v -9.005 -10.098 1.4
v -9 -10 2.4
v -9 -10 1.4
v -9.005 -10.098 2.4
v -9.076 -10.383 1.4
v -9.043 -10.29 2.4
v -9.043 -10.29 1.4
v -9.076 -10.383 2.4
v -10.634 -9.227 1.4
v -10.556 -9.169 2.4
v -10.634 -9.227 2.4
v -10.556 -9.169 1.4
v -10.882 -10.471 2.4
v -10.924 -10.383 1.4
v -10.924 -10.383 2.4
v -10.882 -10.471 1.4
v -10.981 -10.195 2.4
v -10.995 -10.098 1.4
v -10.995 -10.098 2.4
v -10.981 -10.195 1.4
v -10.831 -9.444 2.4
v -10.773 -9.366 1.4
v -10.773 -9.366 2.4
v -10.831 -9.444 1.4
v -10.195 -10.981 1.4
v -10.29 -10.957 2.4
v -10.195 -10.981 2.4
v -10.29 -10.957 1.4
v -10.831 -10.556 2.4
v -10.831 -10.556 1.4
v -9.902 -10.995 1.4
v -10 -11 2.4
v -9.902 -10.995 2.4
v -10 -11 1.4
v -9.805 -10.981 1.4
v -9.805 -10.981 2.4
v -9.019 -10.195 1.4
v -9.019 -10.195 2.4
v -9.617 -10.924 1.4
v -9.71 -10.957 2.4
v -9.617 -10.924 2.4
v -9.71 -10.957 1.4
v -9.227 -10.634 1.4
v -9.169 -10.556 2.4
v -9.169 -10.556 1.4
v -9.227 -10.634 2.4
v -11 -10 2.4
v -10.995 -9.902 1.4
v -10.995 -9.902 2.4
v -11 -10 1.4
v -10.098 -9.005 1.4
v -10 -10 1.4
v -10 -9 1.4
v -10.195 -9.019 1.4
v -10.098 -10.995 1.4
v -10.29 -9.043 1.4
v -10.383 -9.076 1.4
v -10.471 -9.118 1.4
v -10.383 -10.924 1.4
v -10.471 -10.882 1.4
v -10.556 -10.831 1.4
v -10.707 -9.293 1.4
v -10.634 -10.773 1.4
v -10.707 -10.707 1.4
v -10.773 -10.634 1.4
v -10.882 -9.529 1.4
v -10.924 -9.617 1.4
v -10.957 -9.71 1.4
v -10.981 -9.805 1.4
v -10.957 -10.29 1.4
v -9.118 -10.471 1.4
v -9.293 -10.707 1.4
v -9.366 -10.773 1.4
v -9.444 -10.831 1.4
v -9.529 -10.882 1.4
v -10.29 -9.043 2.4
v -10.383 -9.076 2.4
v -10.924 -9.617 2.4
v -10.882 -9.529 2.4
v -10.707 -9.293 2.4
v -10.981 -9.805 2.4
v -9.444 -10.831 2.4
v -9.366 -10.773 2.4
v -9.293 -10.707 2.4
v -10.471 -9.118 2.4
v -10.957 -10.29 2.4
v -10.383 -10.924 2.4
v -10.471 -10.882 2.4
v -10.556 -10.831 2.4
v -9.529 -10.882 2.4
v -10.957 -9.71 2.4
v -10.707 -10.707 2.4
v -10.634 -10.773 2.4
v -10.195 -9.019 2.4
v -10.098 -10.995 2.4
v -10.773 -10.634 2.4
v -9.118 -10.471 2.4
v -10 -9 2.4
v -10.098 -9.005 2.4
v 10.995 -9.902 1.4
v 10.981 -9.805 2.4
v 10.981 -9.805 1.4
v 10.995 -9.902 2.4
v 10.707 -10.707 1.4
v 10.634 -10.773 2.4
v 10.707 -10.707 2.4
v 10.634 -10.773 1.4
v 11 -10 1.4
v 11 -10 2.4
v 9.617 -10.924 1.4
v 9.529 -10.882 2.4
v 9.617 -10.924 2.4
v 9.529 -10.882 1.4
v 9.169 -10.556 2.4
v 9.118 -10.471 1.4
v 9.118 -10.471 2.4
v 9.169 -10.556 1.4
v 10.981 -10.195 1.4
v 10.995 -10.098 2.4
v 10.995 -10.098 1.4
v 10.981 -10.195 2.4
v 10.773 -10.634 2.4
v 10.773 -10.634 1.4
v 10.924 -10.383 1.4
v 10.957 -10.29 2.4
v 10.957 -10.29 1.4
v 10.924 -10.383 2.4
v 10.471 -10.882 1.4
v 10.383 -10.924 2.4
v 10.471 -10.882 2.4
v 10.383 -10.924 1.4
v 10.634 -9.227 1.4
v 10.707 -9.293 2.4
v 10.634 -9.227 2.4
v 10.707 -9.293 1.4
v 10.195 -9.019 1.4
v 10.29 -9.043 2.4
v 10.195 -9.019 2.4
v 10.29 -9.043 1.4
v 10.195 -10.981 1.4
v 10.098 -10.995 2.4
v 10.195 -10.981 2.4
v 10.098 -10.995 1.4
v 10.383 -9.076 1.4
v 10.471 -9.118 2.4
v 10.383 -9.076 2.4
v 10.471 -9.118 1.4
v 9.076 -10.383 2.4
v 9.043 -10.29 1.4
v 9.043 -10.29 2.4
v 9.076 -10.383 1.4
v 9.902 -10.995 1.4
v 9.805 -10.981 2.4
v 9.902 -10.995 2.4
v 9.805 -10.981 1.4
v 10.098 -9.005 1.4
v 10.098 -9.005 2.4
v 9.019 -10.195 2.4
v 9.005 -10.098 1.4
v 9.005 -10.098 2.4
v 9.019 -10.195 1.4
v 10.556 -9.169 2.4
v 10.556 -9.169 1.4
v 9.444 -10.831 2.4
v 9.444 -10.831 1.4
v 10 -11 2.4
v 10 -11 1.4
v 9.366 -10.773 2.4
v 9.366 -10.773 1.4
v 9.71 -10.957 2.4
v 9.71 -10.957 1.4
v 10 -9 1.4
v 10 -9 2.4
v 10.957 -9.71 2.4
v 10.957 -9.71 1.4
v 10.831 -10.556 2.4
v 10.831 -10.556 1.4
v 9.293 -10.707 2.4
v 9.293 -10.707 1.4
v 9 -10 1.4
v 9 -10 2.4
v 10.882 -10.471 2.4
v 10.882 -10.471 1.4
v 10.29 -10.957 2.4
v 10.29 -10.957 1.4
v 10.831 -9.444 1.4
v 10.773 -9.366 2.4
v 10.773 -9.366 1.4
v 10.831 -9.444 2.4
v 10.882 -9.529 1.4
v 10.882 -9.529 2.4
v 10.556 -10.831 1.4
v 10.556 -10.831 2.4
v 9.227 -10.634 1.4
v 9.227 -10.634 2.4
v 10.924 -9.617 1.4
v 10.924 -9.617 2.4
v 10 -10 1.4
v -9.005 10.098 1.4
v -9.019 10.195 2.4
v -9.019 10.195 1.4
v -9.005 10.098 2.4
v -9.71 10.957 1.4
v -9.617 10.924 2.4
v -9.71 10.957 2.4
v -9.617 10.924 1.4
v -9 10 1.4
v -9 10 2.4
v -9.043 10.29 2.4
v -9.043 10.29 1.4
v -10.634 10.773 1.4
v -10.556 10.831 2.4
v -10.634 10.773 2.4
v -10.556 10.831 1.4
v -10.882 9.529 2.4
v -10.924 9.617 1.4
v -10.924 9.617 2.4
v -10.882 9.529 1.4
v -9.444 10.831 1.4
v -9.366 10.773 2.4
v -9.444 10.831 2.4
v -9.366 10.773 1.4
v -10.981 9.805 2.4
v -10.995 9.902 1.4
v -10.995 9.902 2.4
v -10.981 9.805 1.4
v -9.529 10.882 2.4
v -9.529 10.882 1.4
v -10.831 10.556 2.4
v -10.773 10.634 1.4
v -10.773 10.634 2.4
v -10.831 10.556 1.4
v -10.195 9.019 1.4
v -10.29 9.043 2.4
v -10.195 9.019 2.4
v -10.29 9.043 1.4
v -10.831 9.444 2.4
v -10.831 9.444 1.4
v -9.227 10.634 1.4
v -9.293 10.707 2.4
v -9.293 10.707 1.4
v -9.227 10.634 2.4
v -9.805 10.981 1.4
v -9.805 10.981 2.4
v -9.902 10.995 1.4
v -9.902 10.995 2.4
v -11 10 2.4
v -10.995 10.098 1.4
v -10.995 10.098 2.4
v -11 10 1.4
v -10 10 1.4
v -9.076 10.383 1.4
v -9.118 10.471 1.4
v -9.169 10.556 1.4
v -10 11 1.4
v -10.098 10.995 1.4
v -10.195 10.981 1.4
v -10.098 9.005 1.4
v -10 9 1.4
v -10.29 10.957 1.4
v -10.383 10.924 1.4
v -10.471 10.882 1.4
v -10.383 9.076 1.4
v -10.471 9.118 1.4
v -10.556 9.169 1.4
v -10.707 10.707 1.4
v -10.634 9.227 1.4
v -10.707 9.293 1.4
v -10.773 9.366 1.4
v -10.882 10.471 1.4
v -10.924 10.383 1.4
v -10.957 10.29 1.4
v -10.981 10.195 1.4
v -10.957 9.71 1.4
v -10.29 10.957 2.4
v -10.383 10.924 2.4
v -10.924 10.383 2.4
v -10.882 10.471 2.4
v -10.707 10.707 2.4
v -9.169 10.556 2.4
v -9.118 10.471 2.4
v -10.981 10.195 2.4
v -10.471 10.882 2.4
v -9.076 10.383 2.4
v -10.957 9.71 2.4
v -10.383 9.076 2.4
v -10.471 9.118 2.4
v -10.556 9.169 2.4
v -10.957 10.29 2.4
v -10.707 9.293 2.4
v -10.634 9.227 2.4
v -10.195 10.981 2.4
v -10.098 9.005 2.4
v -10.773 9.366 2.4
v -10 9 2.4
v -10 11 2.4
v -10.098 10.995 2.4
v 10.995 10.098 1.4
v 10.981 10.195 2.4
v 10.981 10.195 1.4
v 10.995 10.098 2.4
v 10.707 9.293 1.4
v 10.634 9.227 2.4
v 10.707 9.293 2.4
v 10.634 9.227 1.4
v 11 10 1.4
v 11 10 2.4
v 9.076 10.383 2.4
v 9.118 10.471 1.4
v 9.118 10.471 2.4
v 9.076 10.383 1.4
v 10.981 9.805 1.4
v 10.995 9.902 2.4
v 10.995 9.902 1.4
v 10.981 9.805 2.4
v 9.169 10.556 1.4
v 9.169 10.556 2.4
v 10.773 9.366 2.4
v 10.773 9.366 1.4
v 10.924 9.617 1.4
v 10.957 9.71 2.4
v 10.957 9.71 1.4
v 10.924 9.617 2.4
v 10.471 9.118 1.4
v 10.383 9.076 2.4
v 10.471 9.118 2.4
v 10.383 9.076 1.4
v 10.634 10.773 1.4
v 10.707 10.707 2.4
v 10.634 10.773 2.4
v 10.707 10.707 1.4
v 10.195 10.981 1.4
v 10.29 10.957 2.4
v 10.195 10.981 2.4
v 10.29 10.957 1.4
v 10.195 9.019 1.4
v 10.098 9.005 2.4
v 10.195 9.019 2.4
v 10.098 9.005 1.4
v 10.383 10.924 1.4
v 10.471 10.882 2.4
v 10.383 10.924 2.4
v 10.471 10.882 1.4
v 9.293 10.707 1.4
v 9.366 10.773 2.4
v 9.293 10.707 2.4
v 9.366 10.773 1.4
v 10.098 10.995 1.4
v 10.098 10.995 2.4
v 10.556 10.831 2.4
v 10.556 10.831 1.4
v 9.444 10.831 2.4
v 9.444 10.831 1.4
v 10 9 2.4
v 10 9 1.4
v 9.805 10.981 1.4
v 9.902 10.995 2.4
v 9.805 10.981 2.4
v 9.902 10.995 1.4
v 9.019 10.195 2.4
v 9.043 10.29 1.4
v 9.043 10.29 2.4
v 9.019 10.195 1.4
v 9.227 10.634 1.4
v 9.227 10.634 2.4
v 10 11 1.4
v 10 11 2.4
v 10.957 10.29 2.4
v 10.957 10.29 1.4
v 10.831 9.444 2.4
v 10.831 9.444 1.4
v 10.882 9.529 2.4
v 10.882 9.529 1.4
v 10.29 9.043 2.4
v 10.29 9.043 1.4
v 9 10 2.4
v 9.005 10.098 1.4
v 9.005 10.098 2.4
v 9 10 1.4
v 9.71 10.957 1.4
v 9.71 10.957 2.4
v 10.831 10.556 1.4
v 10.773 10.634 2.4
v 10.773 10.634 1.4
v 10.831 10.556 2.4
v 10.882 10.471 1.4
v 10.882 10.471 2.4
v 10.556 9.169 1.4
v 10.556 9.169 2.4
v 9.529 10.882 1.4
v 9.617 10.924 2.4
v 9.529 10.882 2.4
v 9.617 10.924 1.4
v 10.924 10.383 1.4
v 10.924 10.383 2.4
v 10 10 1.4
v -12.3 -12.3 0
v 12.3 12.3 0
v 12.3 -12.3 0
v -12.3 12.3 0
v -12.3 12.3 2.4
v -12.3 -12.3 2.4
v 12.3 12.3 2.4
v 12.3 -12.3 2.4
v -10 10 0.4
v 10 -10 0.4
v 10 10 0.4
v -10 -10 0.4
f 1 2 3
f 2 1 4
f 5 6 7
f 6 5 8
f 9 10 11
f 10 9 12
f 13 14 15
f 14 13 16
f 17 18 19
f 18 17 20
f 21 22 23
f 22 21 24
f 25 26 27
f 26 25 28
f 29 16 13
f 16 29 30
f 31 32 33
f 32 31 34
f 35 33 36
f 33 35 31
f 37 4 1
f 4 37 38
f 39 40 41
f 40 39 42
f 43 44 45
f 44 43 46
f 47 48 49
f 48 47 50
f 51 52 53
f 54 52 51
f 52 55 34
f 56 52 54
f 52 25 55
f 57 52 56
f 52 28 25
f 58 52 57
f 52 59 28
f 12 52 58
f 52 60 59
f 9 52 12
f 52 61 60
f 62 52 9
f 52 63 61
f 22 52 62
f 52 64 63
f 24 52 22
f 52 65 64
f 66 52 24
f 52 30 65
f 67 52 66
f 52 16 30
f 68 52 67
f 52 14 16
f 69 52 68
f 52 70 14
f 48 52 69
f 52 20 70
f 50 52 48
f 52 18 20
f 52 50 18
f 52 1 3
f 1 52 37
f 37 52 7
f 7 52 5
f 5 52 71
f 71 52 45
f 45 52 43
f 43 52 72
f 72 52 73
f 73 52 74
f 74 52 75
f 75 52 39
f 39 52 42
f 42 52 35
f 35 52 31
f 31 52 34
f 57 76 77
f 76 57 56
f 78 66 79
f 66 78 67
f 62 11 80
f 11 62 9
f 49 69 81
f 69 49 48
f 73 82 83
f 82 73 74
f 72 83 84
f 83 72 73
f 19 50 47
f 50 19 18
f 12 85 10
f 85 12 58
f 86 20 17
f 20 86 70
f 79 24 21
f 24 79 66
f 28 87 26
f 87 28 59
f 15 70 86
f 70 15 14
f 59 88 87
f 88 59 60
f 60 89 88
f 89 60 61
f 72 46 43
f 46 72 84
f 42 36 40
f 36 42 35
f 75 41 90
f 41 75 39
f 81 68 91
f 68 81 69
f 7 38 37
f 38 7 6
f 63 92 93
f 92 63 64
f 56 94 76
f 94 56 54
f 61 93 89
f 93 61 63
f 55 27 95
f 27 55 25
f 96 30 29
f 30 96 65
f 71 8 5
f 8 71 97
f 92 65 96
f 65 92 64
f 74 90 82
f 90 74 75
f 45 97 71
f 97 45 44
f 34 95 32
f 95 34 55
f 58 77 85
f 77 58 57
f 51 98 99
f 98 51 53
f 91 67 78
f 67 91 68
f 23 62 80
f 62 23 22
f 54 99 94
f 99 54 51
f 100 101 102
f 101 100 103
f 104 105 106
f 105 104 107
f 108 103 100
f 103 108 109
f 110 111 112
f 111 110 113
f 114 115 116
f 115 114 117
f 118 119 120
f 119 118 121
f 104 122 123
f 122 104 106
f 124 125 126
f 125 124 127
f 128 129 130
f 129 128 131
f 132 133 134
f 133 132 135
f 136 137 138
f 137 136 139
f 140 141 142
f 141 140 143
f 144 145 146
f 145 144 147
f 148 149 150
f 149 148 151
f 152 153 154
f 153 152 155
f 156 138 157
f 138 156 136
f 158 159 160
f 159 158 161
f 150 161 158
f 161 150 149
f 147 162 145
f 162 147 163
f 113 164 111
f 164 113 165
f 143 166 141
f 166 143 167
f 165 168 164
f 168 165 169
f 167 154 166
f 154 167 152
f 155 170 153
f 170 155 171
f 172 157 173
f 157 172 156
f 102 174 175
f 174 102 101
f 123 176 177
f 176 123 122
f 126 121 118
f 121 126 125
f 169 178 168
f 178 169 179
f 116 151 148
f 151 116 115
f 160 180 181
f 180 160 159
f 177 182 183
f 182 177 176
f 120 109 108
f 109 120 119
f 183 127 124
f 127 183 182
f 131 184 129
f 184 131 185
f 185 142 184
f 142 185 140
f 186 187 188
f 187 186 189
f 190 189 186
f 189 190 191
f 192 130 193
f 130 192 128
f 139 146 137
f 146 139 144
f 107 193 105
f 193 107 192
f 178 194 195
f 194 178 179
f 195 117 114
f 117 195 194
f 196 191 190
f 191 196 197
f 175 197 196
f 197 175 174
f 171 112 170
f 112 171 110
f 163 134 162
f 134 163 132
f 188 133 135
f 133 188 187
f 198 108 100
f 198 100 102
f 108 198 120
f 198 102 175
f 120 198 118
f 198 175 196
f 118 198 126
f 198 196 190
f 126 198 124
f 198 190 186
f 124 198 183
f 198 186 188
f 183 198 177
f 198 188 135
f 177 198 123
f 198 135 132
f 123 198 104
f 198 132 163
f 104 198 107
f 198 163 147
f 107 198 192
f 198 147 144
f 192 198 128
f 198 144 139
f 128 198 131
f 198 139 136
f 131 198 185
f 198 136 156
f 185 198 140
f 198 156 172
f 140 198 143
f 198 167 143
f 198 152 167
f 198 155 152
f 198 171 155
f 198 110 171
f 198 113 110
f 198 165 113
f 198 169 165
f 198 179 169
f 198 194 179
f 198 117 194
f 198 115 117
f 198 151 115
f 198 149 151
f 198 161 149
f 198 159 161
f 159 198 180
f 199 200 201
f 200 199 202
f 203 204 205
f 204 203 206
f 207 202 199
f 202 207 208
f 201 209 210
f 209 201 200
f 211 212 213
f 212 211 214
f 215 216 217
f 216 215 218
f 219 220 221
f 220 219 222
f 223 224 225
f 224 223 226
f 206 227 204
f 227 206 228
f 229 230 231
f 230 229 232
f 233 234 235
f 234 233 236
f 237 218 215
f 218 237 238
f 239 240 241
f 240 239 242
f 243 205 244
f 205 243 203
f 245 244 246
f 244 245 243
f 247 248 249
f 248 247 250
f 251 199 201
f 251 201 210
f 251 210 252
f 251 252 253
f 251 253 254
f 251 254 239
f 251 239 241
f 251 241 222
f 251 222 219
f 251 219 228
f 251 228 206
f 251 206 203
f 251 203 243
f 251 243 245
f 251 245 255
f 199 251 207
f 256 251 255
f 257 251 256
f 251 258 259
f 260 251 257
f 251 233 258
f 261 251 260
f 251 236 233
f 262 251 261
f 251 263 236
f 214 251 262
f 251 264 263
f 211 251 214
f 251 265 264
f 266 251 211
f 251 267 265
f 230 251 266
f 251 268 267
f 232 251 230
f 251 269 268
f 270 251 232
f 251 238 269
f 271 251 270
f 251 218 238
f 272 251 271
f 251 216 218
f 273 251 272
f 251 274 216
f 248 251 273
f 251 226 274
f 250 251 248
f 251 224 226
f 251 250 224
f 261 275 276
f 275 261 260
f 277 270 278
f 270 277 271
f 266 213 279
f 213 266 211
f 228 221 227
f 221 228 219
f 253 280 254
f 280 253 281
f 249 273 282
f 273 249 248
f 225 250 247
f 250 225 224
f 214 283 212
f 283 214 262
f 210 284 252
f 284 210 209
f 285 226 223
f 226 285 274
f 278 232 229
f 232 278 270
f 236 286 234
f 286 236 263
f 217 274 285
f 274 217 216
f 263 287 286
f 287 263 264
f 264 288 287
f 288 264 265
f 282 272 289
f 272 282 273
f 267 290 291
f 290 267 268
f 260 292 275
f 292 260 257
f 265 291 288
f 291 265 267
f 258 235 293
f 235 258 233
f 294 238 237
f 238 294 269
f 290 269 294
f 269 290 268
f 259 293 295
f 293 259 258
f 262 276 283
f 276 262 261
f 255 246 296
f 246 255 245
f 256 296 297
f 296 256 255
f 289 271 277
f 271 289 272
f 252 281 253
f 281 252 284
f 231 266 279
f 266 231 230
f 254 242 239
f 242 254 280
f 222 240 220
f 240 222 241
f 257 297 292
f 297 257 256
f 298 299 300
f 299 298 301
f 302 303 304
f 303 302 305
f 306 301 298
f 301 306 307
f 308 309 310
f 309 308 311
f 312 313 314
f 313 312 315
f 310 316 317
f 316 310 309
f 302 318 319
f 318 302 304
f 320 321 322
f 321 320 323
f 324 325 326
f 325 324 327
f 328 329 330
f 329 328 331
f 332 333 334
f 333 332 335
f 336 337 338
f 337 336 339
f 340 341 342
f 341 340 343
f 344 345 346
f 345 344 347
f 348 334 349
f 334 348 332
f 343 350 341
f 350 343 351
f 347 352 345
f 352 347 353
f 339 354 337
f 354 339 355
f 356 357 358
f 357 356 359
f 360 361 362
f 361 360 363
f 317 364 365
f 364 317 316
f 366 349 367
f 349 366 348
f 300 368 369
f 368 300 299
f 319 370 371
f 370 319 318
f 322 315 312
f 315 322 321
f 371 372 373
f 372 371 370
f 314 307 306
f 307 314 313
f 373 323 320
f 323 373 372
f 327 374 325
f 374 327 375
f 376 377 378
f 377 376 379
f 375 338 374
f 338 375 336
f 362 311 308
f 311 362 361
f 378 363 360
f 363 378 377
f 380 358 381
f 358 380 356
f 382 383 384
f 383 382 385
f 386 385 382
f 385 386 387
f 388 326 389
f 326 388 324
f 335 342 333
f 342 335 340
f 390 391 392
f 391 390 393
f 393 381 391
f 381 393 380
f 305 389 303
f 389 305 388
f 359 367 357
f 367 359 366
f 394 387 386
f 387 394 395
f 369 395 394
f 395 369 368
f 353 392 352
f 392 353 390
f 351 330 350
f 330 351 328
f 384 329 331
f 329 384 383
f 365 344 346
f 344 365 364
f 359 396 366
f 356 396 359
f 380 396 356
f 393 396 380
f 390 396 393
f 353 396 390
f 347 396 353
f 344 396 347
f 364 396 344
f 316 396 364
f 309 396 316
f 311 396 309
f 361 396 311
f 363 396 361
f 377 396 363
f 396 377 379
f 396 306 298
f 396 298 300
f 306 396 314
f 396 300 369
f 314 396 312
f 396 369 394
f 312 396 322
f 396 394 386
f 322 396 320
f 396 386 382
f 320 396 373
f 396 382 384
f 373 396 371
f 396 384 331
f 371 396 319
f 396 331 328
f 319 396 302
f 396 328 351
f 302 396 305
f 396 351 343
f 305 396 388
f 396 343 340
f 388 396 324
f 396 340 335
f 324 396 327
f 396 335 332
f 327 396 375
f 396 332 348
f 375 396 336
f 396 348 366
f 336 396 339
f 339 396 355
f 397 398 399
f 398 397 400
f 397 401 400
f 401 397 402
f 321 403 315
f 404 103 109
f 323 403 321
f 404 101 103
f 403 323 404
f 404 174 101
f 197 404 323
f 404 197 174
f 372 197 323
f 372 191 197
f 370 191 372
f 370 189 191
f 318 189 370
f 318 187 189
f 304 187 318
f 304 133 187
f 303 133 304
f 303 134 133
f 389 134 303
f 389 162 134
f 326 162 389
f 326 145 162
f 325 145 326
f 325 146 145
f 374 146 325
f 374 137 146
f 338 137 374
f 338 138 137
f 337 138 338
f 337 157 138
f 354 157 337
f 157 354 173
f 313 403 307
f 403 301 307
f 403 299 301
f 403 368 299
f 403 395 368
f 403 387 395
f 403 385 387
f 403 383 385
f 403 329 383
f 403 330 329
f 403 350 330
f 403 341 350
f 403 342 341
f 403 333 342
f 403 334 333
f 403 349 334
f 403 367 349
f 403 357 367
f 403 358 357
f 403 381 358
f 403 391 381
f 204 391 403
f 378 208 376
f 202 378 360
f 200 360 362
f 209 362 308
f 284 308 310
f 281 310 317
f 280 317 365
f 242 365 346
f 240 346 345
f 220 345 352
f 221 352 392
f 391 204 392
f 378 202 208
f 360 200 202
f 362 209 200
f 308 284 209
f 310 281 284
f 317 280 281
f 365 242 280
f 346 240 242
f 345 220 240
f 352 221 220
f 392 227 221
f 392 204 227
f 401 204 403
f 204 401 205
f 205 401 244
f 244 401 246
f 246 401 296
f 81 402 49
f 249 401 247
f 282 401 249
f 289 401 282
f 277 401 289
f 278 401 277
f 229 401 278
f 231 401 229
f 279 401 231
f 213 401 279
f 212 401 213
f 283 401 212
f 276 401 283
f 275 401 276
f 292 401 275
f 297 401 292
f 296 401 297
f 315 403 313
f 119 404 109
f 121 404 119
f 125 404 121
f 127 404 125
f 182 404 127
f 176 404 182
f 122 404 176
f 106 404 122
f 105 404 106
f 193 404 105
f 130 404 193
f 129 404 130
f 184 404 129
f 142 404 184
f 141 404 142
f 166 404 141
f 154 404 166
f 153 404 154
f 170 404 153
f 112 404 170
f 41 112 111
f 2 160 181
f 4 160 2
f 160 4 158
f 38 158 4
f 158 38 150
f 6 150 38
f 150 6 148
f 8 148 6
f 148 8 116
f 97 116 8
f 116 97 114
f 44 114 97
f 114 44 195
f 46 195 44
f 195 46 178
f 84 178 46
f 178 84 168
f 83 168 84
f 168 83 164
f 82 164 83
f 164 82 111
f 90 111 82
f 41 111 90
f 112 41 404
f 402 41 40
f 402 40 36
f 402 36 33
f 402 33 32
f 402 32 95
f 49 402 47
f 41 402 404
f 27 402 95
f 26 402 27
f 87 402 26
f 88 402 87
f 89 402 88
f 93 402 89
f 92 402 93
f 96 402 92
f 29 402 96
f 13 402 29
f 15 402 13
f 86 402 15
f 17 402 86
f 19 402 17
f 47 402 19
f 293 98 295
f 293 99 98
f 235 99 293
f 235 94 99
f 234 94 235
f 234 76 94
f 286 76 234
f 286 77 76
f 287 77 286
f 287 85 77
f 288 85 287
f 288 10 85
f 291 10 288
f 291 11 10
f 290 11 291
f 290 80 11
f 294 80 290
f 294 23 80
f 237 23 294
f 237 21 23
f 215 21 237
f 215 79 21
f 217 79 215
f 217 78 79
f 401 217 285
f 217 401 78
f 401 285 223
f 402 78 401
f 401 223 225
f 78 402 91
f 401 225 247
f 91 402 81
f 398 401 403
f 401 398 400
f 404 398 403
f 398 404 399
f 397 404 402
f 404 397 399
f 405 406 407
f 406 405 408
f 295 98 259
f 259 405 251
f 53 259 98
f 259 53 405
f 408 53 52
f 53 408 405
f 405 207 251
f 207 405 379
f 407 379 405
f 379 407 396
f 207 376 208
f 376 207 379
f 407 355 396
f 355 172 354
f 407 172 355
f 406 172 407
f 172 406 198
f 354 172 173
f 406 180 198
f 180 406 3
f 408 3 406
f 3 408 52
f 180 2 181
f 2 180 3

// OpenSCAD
nozzle = 0.4;

magnet_r = 1.00;
magnet_h = 1.00;
base_h = 0.40;

box = [20.00, 20.00, 2.00];

n = magnet_r * 3 + 1.6;

module alg_next_each_other_x(count = 2, w = 10.00, center = true) {
    translate([center ? -w * count / 2 + w/2 : 0, 0, 0])
        for (offset = [0:count - 1])
            translate([offset * w, 0, 0])
                children();
}

module alg_next_each_other_y(count = 2, w = 10.00, center = true) {
    translate([0, center ? -w * count / 2 + w/2 : 0, 0])
        for (offset = [0:count - 1])
            translate([0, offset * w, 0])
                children();
}

$fn = 64;

difference() {
    linear_extrude(box[2] + base_h)
        square(box[0] + n, box[1] + n, center = true);
    
    translate([0, 0, box[2] + base_h - magnet_h])
        alg_next_each_other_y(2, box[0])
            alg_next_each_other_x(2, box[1])
                linear_extrude(magnet_h)
                    circle(magnet_r);

    translate([0, 0, base_h])
        linear_extrude(box[2])
            square(box[0], box[1], center = true);
    
    
    
}
